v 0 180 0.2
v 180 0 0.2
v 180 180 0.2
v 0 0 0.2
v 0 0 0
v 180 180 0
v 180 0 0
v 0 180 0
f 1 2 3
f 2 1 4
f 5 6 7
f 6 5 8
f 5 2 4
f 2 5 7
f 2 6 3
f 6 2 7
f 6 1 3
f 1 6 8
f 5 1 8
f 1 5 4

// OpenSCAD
// shape?
buildbed = "square"; // [round,square]

// in mm
diameter = 180; // [10:10:500]

// in mm
height = 0.2; // [0.005:0.005:1]

if (buildbed=="round")
    cylinder(d=diameter, height, $fn=diameter);
else
    cube([diameter,diameter,height]);
